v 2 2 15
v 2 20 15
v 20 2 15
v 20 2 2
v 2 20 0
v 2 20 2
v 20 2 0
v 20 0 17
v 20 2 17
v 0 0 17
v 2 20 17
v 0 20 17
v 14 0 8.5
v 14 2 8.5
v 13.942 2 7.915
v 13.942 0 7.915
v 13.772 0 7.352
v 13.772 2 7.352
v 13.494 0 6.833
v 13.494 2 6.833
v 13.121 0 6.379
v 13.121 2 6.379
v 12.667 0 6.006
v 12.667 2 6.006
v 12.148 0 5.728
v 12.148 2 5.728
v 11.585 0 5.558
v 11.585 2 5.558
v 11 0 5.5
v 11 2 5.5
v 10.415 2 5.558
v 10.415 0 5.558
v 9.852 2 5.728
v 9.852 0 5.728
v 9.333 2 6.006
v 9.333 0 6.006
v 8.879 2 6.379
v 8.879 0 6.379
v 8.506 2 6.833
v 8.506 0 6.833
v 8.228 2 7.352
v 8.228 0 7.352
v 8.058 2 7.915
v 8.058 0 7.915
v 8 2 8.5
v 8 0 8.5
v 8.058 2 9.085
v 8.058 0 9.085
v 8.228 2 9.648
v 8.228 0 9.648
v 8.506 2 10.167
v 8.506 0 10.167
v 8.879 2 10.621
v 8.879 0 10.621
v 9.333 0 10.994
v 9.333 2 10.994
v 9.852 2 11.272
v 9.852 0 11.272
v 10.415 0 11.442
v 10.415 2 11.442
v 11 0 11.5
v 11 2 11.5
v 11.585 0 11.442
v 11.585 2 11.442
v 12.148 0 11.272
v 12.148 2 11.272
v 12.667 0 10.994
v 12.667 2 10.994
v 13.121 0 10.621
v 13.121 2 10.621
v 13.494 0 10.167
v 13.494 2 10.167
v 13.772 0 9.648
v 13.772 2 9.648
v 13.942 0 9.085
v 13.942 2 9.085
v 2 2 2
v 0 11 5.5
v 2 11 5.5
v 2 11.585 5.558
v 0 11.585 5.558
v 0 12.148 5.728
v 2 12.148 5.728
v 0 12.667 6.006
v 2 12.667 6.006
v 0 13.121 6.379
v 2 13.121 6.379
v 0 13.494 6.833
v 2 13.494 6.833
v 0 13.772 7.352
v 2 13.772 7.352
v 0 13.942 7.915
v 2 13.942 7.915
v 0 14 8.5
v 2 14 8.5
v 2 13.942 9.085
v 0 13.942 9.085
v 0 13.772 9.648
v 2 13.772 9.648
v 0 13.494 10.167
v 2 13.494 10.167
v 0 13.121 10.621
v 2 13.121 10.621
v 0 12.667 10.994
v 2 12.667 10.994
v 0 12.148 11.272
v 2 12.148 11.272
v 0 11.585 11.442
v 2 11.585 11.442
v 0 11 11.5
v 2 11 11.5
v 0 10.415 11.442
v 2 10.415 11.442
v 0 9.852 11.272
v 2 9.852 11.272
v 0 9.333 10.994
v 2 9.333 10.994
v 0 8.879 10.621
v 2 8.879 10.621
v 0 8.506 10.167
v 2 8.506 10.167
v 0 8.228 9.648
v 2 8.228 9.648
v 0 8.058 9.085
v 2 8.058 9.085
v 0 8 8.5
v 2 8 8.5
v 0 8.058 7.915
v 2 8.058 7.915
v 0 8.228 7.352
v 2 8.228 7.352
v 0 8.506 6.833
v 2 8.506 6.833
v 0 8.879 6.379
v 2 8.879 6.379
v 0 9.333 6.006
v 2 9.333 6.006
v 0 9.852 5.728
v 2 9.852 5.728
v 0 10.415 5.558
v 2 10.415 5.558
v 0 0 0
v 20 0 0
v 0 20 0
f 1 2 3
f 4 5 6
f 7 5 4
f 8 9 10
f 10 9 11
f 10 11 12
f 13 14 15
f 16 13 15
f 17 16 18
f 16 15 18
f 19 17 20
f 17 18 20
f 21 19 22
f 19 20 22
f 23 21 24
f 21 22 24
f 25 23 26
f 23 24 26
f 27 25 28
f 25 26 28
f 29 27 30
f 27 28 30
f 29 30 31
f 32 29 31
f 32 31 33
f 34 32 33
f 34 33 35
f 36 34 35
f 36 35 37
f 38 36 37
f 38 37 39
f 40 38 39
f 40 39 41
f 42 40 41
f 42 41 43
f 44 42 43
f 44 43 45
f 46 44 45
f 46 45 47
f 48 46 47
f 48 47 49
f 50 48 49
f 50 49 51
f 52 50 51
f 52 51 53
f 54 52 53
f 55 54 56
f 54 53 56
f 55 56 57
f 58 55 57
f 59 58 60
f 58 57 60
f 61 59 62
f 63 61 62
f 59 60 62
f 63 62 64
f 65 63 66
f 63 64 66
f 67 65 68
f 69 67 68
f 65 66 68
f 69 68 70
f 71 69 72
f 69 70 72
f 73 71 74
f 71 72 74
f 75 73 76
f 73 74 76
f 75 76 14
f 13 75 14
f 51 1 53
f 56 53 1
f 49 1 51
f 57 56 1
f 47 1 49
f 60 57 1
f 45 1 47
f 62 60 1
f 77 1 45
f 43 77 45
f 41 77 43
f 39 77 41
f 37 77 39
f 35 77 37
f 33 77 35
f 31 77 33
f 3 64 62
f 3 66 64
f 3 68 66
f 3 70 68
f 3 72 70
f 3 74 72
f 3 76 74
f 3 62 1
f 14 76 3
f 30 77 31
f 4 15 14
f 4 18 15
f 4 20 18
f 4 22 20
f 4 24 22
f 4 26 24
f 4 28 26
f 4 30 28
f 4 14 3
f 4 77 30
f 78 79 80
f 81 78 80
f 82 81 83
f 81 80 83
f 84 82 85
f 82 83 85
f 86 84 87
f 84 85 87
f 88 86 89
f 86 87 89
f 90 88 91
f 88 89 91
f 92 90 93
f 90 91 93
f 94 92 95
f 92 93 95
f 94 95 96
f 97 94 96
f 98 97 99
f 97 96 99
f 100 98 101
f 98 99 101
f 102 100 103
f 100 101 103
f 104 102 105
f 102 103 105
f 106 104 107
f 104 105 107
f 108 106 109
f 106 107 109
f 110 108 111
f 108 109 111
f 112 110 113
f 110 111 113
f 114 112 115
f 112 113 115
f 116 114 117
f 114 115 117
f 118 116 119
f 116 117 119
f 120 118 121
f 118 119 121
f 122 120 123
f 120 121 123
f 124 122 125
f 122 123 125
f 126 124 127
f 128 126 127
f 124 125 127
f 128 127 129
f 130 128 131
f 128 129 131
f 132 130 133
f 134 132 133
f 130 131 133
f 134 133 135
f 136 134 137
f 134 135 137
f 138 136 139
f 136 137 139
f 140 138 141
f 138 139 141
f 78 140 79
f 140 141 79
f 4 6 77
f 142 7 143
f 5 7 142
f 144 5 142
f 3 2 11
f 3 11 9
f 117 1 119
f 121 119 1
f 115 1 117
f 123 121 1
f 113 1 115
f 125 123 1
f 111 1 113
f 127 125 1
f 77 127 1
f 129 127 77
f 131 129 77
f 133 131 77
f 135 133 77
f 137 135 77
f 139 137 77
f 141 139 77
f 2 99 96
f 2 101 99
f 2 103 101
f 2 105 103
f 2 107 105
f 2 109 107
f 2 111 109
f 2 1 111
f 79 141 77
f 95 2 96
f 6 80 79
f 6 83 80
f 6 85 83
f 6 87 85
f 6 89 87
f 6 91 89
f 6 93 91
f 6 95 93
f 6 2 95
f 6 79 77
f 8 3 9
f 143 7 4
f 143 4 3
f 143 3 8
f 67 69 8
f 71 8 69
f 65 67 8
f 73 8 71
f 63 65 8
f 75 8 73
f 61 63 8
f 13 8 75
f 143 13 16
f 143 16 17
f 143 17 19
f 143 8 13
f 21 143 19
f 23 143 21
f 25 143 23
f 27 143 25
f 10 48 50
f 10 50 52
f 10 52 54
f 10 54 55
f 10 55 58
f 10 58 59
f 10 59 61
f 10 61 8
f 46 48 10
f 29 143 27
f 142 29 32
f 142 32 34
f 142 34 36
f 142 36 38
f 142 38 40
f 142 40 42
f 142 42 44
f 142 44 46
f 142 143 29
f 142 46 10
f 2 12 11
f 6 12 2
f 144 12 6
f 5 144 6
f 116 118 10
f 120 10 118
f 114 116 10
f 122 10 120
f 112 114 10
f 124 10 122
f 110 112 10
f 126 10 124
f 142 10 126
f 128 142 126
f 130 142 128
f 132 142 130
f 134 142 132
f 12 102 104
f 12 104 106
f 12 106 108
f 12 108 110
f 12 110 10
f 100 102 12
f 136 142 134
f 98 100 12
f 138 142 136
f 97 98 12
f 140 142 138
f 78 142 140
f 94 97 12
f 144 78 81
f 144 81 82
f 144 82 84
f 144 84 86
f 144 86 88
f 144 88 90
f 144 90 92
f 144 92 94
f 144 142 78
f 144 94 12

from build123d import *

# Parameters (mm, degrees)
RESSALTO_EXTRUS_O1_DEPTH = 17
ESBO_O2_W                = 18
ESBO_O2_H                = 13
CORTE_EXTRUS_O1_DEPTH    = 18
ESBO_O3_R                = 3
CORTE_EXTRUS_O2_DEPTH    = 2
ESBO_O4_R                = 3
CORTE_EXTRUS_O3_DEPTH    = 3


with BuildPart() as part:
    # Esboço1 → Ressalto-extrusão1 (new body)
    with BuildSketch(Plane.XY):
        Polygon((0, 0), (0, 20), (2, 20), (20, 2), (20, 0), align=None)
    extrude(amount=RESSALTO_EXTRUS_O1_DEPTH)

    # Esboço2 → Corte-extrusão1 (cut)
    with BuildSketch(Plane(origin=(0, 20, 0), x_dir=(1, 0, 0), z_dir=(0, 1, 0))):
        with Locations((11, -8.5)):
            Rectangle(ESBO_O2_W, ESBO_O2_H)
    extrude(amount=-CORTE_EXTRUS_O1_DEPTH, mode=Mode.SUBTRACT)

    # Esboço3 → Corte-extrusão2 (cut)
    with BuildSketch(Plane(origin=(2, 0, 0), x_dir=(0, 0, -1), z_dir=(1, 0, 0))):
        with Locations((-8.5, 11)):
            Circle(ESBO_O3_R)
    extrude(amount=-CORTE_EXTRUS_O2_DEPTH, mode=Mode.SUBTRACT)

    # Esboço4 → Corte-extrusão3 (cut, through all)
    with BuildSketch(Plane(origin=(0, 2, 0), x_dir=(1, 0, 0), z_dir=(0, 1, 0))):
        with Locations((11, -8.5)):
            Circle(ESBO_O4_R)
    extrude(amount=-CORTE_EXTRUS_O3_DEPTH, mode=Mode.SUBTRACT)


solid = part.part
